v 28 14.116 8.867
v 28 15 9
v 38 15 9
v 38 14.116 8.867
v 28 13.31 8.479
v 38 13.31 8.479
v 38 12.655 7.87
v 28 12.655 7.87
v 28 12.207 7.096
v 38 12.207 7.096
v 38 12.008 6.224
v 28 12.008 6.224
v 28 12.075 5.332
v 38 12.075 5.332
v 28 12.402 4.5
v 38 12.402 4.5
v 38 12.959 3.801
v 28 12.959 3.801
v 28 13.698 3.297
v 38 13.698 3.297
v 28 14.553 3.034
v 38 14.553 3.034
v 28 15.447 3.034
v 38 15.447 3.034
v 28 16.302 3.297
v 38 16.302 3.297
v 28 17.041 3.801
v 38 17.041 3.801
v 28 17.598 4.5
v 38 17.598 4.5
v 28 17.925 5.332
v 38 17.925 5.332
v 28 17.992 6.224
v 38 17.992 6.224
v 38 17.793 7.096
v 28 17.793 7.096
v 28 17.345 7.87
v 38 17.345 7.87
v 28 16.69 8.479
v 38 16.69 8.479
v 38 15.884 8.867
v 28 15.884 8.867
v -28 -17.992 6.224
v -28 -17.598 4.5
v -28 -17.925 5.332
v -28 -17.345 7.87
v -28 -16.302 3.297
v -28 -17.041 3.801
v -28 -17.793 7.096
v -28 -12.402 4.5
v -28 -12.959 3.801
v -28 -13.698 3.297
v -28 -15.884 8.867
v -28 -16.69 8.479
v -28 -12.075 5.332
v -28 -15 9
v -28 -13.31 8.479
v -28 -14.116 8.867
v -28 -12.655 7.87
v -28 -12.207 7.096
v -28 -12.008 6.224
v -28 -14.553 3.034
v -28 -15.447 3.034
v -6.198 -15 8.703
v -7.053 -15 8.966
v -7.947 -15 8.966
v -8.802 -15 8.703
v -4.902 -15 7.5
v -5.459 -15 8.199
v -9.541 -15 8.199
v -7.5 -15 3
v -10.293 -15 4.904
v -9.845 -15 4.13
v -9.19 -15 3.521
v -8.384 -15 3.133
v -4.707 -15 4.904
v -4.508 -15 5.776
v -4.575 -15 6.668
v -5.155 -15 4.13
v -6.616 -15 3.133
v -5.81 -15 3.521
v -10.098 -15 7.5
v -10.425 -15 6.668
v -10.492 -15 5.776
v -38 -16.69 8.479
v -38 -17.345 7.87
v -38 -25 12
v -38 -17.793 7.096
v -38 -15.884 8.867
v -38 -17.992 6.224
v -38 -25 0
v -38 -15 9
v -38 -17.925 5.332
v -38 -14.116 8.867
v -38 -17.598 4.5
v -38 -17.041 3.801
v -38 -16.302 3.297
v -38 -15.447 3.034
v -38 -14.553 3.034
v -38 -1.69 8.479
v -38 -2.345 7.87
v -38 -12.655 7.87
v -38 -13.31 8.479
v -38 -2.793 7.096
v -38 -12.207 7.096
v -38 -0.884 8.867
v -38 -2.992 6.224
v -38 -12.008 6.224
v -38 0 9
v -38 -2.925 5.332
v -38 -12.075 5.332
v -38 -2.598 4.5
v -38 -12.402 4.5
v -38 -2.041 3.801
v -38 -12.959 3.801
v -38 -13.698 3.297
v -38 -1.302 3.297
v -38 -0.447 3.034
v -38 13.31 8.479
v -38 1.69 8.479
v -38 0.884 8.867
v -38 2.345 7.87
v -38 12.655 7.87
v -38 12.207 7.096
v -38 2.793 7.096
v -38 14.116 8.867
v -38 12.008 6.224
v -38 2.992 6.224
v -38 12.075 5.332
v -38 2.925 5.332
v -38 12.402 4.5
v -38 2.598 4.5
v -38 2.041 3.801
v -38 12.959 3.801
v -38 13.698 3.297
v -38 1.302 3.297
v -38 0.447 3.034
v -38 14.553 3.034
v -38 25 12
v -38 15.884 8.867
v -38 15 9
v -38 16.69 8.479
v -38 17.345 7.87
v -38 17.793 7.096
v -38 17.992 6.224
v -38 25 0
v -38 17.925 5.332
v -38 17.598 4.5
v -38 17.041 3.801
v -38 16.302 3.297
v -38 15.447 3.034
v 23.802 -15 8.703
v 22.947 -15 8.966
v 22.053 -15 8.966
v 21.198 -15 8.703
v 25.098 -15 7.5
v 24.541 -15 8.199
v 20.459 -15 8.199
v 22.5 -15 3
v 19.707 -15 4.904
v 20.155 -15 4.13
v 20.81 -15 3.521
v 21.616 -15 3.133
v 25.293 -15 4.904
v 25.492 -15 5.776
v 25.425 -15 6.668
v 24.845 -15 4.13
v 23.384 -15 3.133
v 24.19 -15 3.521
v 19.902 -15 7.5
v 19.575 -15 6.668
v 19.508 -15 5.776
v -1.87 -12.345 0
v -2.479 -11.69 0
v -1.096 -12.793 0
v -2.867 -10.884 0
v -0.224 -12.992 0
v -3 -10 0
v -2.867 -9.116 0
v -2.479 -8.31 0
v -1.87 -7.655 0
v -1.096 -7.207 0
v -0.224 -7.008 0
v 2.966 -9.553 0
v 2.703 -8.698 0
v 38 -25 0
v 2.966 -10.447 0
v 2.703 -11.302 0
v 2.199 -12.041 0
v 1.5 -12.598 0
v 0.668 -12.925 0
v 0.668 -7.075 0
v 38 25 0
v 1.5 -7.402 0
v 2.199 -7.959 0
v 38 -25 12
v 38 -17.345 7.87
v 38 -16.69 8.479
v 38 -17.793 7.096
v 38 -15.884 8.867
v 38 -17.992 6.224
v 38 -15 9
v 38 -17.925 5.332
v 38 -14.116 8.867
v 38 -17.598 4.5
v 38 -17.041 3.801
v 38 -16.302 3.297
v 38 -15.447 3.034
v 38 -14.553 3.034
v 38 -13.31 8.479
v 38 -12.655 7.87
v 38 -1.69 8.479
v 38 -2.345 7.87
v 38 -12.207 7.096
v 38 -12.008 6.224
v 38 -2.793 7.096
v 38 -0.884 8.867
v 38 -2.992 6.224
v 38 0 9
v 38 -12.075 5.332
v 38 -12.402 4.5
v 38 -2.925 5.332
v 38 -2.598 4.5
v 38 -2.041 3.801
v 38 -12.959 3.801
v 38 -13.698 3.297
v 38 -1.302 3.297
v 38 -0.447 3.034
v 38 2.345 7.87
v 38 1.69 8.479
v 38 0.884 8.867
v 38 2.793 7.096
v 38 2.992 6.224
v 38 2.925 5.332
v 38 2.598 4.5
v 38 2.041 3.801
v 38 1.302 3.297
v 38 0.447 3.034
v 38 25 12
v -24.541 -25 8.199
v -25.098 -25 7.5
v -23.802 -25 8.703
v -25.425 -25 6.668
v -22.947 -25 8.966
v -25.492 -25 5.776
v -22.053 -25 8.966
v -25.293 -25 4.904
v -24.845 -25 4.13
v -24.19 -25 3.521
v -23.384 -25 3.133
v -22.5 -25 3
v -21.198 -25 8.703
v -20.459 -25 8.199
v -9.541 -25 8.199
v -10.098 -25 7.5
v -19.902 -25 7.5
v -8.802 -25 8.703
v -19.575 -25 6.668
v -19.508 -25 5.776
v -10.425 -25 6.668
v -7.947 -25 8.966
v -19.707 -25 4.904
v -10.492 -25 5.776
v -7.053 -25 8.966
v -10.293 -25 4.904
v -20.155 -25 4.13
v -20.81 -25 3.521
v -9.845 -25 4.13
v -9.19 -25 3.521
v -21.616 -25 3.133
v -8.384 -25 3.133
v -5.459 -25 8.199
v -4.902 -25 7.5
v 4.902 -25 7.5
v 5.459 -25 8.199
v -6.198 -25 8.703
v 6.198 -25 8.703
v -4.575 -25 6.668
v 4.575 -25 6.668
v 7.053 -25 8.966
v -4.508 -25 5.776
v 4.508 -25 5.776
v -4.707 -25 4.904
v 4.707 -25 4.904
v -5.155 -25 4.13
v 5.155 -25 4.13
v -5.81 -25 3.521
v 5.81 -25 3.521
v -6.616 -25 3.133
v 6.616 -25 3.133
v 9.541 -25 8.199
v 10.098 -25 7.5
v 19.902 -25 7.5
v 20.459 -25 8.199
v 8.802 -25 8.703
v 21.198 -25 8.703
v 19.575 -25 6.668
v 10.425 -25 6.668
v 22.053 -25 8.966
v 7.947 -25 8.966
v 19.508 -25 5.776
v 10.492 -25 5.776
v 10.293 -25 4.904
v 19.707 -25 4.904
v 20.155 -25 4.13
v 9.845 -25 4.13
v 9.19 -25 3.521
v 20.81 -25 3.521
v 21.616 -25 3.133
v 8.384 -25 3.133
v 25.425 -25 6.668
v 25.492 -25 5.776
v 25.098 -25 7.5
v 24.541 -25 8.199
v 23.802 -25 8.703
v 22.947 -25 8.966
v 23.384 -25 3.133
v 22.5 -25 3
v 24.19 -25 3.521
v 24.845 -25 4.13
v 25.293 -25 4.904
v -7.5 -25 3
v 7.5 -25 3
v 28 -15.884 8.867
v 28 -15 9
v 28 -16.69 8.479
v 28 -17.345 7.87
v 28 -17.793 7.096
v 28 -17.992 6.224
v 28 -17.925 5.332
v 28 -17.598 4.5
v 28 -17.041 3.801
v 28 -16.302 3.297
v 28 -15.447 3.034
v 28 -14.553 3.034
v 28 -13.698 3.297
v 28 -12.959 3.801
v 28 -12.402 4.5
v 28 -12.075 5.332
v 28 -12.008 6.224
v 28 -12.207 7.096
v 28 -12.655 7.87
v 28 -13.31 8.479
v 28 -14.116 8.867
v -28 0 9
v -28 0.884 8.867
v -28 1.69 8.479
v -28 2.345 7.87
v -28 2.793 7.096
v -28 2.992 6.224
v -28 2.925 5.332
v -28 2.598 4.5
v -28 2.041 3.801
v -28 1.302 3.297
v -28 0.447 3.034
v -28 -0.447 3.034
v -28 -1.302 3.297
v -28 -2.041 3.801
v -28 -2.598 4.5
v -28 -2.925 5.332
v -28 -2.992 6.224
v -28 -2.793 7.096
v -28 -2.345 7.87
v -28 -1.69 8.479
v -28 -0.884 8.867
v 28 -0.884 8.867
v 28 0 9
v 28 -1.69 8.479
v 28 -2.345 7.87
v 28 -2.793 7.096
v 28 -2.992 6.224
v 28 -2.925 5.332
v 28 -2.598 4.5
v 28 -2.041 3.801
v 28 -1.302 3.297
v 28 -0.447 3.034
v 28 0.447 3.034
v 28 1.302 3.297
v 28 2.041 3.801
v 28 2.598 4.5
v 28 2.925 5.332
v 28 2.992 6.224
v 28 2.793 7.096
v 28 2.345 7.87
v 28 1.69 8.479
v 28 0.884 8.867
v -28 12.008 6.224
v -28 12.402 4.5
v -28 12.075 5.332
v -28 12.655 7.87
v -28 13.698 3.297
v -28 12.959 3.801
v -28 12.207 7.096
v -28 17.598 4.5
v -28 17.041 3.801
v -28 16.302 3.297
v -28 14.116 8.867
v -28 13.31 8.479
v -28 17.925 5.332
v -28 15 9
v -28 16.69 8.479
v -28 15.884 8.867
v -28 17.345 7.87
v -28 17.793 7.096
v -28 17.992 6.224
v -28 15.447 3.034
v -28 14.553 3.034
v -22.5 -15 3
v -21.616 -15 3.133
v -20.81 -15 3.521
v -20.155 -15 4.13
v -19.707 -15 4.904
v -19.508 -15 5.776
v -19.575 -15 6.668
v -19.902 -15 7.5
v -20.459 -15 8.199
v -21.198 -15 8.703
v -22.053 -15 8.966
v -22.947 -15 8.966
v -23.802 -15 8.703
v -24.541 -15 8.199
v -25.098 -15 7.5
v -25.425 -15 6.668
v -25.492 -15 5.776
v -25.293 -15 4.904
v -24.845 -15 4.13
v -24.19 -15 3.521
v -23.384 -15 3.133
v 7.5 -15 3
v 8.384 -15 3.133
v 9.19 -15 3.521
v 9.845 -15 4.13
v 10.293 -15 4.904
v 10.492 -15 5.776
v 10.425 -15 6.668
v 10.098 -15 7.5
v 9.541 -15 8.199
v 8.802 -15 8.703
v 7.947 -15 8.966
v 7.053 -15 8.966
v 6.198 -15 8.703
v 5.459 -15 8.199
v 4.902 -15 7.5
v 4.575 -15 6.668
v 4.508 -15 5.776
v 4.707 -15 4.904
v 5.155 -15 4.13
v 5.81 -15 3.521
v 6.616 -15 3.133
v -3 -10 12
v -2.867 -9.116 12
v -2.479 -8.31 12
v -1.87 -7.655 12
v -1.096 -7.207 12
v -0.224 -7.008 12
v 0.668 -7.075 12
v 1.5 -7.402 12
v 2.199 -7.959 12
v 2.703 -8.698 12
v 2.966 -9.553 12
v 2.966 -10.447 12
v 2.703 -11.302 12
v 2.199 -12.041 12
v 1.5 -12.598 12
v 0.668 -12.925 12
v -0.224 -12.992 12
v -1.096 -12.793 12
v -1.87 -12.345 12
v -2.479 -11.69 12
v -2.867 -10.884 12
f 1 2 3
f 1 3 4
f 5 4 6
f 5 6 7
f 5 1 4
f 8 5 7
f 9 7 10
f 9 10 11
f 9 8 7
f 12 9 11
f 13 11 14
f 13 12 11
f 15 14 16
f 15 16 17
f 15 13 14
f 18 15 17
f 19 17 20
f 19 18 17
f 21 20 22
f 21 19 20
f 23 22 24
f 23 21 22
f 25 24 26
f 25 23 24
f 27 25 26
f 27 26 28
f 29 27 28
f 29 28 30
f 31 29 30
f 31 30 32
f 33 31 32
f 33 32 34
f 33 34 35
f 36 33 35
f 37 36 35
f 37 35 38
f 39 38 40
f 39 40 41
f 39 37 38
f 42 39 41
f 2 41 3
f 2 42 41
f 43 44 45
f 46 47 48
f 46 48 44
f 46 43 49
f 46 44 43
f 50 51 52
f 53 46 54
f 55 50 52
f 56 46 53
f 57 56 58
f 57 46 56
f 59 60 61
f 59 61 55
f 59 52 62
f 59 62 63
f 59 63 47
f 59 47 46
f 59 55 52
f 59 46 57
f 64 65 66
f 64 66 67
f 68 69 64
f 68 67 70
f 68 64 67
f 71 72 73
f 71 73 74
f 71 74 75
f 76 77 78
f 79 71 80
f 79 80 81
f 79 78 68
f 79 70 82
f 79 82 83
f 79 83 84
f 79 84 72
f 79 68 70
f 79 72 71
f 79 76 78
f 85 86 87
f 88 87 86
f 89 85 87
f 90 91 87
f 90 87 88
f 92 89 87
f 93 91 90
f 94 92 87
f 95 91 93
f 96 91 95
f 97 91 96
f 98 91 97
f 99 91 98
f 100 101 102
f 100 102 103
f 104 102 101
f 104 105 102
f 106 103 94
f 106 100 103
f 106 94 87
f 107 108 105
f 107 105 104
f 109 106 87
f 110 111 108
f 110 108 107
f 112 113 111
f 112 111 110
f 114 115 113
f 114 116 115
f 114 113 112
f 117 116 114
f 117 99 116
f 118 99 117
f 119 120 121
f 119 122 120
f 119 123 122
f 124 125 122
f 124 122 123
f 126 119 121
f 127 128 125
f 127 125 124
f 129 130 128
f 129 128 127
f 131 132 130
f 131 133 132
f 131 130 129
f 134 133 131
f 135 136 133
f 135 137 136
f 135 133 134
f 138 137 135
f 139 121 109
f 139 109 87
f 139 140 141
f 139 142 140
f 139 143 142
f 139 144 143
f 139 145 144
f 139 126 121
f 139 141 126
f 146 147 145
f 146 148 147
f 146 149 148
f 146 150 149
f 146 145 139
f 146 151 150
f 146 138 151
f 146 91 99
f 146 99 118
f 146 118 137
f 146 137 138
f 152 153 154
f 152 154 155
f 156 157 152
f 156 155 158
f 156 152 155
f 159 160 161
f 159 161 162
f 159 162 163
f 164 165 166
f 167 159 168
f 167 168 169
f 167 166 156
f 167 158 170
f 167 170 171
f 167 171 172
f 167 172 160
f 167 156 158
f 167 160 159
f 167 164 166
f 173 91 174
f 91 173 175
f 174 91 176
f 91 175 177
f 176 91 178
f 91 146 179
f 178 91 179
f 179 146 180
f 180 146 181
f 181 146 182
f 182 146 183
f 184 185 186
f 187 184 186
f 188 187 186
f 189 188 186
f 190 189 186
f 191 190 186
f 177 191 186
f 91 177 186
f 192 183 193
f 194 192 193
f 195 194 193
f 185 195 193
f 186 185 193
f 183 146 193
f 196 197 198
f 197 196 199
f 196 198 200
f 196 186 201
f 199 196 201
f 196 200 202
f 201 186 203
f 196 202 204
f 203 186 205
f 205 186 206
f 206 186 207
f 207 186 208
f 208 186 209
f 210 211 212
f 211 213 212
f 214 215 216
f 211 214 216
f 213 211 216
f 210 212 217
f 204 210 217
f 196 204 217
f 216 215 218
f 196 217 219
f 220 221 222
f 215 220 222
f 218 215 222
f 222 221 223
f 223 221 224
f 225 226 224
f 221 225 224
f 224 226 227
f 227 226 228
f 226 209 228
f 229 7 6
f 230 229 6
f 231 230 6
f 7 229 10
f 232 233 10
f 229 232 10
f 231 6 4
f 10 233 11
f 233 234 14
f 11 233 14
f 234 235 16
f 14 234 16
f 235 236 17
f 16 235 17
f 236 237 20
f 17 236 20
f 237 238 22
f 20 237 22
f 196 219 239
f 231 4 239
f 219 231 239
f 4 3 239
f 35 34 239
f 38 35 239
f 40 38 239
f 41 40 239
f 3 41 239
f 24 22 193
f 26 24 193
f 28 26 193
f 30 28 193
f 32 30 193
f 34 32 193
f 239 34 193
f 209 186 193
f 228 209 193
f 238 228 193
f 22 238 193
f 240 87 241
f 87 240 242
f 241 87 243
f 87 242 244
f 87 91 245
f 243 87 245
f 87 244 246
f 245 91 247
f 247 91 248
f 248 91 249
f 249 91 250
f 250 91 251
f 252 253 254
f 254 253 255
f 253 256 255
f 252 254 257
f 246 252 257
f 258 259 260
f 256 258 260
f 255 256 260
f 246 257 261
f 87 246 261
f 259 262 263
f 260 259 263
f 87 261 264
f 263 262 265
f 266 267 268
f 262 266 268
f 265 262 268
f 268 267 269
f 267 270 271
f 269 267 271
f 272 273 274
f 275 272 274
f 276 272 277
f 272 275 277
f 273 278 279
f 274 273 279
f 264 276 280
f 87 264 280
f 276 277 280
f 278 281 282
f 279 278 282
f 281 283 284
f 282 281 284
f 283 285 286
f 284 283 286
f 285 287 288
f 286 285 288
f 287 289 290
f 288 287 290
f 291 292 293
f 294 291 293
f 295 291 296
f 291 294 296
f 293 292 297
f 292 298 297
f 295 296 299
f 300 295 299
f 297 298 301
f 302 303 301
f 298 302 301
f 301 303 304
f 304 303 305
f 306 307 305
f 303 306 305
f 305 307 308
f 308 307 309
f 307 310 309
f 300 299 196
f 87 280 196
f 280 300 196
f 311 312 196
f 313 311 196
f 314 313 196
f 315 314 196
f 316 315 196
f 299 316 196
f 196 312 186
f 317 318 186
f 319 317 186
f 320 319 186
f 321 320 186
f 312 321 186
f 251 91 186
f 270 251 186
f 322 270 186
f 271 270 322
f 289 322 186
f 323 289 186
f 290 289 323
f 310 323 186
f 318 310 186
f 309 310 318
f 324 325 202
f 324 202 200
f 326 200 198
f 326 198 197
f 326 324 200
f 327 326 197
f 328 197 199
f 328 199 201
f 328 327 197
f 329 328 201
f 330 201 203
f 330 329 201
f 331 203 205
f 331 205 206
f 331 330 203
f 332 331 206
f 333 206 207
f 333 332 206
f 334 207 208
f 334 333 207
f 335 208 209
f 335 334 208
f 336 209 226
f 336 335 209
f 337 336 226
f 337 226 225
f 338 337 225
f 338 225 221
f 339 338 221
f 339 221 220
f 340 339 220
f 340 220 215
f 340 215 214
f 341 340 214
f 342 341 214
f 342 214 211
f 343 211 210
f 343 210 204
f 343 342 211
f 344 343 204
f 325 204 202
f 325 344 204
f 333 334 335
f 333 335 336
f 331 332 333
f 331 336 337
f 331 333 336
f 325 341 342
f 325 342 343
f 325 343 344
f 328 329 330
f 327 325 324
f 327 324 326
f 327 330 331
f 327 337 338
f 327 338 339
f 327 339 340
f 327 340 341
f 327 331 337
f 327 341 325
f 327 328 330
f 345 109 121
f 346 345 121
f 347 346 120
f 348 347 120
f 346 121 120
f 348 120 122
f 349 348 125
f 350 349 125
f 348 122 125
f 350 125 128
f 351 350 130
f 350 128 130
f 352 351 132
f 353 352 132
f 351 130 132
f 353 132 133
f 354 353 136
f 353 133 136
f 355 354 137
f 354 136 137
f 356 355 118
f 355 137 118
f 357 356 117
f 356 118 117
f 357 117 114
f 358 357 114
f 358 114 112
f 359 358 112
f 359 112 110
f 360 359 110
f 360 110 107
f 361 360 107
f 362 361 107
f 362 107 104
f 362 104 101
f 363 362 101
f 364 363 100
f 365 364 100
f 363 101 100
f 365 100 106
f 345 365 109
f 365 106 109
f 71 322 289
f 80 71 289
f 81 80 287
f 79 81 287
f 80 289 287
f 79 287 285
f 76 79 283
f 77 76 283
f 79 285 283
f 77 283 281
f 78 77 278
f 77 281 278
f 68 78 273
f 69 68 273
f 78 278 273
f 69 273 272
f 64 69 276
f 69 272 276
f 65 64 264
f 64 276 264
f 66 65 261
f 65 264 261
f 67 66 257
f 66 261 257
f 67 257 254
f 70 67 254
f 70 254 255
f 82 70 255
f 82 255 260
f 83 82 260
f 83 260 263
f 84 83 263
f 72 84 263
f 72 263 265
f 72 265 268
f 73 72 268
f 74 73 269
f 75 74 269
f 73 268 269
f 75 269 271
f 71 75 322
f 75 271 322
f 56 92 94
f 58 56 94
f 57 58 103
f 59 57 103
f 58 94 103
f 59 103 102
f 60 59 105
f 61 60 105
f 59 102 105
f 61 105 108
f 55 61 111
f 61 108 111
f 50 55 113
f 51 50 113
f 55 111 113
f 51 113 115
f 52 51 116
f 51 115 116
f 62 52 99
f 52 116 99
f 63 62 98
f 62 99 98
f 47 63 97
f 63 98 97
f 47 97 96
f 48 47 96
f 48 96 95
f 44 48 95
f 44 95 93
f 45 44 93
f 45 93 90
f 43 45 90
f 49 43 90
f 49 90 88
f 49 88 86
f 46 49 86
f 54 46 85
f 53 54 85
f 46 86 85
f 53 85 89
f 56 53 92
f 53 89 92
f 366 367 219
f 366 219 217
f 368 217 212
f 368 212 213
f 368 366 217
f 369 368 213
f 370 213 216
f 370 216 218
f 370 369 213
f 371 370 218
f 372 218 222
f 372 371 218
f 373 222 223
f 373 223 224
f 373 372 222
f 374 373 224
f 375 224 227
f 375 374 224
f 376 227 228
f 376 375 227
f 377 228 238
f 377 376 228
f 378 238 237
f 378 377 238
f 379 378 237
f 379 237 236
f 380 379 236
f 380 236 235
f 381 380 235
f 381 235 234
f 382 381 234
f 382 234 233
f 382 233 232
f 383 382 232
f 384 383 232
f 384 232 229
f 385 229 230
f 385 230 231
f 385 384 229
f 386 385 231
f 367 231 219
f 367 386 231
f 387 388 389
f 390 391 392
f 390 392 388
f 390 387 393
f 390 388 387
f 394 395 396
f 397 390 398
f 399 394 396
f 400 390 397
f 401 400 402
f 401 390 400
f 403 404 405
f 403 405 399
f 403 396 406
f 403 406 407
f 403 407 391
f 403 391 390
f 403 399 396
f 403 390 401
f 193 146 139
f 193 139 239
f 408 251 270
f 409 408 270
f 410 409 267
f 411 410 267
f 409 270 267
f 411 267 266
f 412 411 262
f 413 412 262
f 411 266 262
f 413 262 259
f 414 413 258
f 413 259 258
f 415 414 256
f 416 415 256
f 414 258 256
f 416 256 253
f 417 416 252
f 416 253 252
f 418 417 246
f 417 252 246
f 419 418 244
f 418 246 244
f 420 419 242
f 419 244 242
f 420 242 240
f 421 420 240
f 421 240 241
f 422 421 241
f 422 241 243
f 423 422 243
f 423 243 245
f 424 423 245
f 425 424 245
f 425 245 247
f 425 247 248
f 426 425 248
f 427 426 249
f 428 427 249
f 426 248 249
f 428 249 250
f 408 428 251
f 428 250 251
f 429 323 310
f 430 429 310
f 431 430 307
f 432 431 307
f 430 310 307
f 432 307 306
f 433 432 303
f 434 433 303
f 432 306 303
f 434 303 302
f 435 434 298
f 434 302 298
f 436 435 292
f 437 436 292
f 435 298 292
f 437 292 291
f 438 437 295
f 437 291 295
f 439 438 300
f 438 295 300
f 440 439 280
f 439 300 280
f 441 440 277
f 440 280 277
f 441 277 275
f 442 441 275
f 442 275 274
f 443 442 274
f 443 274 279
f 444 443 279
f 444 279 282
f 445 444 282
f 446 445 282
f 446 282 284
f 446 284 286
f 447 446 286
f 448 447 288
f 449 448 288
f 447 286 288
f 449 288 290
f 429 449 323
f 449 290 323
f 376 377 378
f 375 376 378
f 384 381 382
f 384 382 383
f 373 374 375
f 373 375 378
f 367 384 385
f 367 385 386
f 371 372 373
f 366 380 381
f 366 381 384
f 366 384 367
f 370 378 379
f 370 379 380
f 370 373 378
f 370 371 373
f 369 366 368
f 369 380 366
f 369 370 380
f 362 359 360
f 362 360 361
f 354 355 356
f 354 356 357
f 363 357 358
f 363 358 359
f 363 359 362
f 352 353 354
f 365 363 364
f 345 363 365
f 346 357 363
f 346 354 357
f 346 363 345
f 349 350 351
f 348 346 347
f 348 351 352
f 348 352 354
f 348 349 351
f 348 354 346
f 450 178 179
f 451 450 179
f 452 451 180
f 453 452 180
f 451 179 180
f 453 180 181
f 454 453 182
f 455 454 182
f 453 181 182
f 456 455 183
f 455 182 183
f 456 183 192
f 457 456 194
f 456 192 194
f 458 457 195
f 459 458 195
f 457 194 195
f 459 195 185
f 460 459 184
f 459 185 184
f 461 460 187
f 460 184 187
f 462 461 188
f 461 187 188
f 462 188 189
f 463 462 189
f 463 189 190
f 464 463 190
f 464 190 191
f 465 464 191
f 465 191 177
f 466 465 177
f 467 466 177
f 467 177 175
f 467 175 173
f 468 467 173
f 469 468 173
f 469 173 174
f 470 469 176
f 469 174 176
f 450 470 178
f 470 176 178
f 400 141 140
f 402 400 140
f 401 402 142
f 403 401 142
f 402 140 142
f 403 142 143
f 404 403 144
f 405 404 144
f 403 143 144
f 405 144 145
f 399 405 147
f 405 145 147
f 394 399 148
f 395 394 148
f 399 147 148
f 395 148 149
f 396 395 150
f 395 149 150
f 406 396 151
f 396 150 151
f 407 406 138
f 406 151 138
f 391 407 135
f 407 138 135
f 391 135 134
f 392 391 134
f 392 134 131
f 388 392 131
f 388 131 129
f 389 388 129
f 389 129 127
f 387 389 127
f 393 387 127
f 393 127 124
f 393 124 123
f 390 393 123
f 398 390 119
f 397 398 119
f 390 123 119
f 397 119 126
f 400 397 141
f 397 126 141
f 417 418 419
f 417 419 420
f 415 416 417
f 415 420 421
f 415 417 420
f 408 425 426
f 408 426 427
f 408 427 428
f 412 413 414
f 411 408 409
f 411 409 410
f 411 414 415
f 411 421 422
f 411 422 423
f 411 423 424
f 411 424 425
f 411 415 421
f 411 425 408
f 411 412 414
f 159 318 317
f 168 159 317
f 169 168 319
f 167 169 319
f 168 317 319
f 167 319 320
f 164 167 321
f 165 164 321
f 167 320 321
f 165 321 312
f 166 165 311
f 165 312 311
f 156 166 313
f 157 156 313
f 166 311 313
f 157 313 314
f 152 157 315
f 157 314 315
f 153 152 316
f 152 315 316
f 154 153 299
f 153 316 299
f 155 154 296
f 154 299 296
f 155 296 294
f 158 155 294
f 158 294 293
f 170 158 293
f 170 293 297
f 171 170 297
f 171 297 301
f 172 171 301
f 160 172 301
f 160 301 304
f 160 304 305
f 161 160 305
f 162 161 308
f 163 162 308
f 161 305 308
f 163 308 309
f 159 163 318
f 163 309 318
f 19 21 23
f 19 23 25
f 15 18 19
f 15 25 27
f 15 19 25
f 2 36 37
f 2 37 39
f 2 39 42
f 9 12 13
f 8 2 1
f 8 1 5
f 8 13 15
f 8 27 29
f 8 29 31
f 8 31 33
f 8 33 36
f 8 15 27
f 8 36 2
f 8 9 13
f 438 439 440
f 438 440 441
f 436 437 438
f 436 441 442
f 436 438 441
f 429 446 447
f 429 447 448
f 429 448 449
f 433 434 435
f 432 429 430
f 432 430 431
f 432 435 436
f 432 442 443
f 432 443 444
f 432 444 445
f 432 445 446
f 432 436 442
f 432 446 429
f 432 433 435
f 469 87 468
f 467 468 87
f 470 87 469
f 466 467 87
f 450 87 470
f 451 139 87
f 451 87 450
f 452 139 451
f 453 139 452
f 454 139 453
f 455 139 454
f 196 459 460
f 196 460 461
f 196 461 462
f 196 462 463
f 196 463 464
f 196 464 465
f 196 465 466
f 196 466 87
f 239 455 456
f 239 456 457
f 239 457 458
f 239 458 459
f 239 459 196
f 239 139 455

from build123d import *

# Parameters (mm, degrees)
SKETCH_1_W          = 76
SKETCH_1_H          = 50
EXTRUDE_1_DEPTH     = 12
SKETCH_2_R          = 3
CUT_EXTRUDE_1_DEPTH = 10
CUT_EXTRUDE_START   = -10
SKETCH_3_R          = 3
CUT_EXTRUDE_2_DEPTH = 10
SKETCH_4_R          = 3
CUT_EXTRUDE_3_DEPTH = 10
SKETCH_5_R          = 3
CUT_EXTRUDE_4_DEPTH = 12


with BuildPart() as part:
    # 草图1 → 凸台-拉伸1 (new body)
    with BuildSketch(Plane.XY):
        Rectangle(SKETCH_1_W, SKETCH_1_H)
    extrude(amount=EXTRUDE_1_DEPTH)

    # 草图2 → 切除-拉伸1 (cut)
    with BuildSketch(Plane.ZY.offset(38)):
        with Locations((6, -15)):
            Circle(SKETCH_2_R)
        with Locations((6, 0)):
            Circle(SKETCH_2_R)
        with Locations((6, 15)):
            Circle(SKETCH_2_R)
    extrude(amount=-CUT_EXTRUDE_1_DEPTH, mode=Mode.SUBTRACT)

    # 草图3 → 切除-拉伸2 (cut)
    with BuildSketch(Plane(origin=(38, 0, 0), x_dir=(0, 0, -1), z_dir=(1, 0, 0)).offset(CUT_EXTRUDE_START)):
        with Locations(Location((-6, -15, 0), (0, 0, 180))):
            Circle(SKETCH_3_R)
        with Locations(Location((-6, 0, 0), (0, 0, 180))):
            Circle(SKETCH_3_R)
        with Locations(Location((-6, 15, 0), (0, 0, 180))):
            Circle(SKETCH_3_R)
    extrude(amount=CUT_EXTRUDE_2_DEPTH, mode=Mode.SUBTRACT)

    # 草图4 → 切除-拉伸3 (cut)
    with BuildSketch(Plane.XZ.offset(25)):
        with Locations(Location((22.5, 6, 0), (0, 0, 270))):
            Circle(SKETCH_4_R)
        with Locations(Location((7.5, 6, 0), (0, 0, 270))):
            Circle(SKETCH_4_R)
        with Locations(Location((-7.5, 6, 0), (0, 0, 270))):
            Circle(SKETCH_4_R)
        with Locations(Location((-22.5, 6, 0), (0, 0, 270))):
            Circle(SKETCH_4_R)
    extrude(amount=-CUT_EXTRUDE_3_DEPTH, mode=Mode.SUBTRACT)

    # 草图5 → 切除-拉伸4 (cut)
    with BuildSketch(Plane(origin=(0, 0, 0), x_dir=(-1, 0, 0), z_dir=(0, 0, -1))):
        with Locations((0, -10)):
            Circle(SKETCH_5_R)
    extrude(amount=-CUT_EXTRUDE_4_DEPTH, mode=Mode.SUBTRACT)


solid = part.part
